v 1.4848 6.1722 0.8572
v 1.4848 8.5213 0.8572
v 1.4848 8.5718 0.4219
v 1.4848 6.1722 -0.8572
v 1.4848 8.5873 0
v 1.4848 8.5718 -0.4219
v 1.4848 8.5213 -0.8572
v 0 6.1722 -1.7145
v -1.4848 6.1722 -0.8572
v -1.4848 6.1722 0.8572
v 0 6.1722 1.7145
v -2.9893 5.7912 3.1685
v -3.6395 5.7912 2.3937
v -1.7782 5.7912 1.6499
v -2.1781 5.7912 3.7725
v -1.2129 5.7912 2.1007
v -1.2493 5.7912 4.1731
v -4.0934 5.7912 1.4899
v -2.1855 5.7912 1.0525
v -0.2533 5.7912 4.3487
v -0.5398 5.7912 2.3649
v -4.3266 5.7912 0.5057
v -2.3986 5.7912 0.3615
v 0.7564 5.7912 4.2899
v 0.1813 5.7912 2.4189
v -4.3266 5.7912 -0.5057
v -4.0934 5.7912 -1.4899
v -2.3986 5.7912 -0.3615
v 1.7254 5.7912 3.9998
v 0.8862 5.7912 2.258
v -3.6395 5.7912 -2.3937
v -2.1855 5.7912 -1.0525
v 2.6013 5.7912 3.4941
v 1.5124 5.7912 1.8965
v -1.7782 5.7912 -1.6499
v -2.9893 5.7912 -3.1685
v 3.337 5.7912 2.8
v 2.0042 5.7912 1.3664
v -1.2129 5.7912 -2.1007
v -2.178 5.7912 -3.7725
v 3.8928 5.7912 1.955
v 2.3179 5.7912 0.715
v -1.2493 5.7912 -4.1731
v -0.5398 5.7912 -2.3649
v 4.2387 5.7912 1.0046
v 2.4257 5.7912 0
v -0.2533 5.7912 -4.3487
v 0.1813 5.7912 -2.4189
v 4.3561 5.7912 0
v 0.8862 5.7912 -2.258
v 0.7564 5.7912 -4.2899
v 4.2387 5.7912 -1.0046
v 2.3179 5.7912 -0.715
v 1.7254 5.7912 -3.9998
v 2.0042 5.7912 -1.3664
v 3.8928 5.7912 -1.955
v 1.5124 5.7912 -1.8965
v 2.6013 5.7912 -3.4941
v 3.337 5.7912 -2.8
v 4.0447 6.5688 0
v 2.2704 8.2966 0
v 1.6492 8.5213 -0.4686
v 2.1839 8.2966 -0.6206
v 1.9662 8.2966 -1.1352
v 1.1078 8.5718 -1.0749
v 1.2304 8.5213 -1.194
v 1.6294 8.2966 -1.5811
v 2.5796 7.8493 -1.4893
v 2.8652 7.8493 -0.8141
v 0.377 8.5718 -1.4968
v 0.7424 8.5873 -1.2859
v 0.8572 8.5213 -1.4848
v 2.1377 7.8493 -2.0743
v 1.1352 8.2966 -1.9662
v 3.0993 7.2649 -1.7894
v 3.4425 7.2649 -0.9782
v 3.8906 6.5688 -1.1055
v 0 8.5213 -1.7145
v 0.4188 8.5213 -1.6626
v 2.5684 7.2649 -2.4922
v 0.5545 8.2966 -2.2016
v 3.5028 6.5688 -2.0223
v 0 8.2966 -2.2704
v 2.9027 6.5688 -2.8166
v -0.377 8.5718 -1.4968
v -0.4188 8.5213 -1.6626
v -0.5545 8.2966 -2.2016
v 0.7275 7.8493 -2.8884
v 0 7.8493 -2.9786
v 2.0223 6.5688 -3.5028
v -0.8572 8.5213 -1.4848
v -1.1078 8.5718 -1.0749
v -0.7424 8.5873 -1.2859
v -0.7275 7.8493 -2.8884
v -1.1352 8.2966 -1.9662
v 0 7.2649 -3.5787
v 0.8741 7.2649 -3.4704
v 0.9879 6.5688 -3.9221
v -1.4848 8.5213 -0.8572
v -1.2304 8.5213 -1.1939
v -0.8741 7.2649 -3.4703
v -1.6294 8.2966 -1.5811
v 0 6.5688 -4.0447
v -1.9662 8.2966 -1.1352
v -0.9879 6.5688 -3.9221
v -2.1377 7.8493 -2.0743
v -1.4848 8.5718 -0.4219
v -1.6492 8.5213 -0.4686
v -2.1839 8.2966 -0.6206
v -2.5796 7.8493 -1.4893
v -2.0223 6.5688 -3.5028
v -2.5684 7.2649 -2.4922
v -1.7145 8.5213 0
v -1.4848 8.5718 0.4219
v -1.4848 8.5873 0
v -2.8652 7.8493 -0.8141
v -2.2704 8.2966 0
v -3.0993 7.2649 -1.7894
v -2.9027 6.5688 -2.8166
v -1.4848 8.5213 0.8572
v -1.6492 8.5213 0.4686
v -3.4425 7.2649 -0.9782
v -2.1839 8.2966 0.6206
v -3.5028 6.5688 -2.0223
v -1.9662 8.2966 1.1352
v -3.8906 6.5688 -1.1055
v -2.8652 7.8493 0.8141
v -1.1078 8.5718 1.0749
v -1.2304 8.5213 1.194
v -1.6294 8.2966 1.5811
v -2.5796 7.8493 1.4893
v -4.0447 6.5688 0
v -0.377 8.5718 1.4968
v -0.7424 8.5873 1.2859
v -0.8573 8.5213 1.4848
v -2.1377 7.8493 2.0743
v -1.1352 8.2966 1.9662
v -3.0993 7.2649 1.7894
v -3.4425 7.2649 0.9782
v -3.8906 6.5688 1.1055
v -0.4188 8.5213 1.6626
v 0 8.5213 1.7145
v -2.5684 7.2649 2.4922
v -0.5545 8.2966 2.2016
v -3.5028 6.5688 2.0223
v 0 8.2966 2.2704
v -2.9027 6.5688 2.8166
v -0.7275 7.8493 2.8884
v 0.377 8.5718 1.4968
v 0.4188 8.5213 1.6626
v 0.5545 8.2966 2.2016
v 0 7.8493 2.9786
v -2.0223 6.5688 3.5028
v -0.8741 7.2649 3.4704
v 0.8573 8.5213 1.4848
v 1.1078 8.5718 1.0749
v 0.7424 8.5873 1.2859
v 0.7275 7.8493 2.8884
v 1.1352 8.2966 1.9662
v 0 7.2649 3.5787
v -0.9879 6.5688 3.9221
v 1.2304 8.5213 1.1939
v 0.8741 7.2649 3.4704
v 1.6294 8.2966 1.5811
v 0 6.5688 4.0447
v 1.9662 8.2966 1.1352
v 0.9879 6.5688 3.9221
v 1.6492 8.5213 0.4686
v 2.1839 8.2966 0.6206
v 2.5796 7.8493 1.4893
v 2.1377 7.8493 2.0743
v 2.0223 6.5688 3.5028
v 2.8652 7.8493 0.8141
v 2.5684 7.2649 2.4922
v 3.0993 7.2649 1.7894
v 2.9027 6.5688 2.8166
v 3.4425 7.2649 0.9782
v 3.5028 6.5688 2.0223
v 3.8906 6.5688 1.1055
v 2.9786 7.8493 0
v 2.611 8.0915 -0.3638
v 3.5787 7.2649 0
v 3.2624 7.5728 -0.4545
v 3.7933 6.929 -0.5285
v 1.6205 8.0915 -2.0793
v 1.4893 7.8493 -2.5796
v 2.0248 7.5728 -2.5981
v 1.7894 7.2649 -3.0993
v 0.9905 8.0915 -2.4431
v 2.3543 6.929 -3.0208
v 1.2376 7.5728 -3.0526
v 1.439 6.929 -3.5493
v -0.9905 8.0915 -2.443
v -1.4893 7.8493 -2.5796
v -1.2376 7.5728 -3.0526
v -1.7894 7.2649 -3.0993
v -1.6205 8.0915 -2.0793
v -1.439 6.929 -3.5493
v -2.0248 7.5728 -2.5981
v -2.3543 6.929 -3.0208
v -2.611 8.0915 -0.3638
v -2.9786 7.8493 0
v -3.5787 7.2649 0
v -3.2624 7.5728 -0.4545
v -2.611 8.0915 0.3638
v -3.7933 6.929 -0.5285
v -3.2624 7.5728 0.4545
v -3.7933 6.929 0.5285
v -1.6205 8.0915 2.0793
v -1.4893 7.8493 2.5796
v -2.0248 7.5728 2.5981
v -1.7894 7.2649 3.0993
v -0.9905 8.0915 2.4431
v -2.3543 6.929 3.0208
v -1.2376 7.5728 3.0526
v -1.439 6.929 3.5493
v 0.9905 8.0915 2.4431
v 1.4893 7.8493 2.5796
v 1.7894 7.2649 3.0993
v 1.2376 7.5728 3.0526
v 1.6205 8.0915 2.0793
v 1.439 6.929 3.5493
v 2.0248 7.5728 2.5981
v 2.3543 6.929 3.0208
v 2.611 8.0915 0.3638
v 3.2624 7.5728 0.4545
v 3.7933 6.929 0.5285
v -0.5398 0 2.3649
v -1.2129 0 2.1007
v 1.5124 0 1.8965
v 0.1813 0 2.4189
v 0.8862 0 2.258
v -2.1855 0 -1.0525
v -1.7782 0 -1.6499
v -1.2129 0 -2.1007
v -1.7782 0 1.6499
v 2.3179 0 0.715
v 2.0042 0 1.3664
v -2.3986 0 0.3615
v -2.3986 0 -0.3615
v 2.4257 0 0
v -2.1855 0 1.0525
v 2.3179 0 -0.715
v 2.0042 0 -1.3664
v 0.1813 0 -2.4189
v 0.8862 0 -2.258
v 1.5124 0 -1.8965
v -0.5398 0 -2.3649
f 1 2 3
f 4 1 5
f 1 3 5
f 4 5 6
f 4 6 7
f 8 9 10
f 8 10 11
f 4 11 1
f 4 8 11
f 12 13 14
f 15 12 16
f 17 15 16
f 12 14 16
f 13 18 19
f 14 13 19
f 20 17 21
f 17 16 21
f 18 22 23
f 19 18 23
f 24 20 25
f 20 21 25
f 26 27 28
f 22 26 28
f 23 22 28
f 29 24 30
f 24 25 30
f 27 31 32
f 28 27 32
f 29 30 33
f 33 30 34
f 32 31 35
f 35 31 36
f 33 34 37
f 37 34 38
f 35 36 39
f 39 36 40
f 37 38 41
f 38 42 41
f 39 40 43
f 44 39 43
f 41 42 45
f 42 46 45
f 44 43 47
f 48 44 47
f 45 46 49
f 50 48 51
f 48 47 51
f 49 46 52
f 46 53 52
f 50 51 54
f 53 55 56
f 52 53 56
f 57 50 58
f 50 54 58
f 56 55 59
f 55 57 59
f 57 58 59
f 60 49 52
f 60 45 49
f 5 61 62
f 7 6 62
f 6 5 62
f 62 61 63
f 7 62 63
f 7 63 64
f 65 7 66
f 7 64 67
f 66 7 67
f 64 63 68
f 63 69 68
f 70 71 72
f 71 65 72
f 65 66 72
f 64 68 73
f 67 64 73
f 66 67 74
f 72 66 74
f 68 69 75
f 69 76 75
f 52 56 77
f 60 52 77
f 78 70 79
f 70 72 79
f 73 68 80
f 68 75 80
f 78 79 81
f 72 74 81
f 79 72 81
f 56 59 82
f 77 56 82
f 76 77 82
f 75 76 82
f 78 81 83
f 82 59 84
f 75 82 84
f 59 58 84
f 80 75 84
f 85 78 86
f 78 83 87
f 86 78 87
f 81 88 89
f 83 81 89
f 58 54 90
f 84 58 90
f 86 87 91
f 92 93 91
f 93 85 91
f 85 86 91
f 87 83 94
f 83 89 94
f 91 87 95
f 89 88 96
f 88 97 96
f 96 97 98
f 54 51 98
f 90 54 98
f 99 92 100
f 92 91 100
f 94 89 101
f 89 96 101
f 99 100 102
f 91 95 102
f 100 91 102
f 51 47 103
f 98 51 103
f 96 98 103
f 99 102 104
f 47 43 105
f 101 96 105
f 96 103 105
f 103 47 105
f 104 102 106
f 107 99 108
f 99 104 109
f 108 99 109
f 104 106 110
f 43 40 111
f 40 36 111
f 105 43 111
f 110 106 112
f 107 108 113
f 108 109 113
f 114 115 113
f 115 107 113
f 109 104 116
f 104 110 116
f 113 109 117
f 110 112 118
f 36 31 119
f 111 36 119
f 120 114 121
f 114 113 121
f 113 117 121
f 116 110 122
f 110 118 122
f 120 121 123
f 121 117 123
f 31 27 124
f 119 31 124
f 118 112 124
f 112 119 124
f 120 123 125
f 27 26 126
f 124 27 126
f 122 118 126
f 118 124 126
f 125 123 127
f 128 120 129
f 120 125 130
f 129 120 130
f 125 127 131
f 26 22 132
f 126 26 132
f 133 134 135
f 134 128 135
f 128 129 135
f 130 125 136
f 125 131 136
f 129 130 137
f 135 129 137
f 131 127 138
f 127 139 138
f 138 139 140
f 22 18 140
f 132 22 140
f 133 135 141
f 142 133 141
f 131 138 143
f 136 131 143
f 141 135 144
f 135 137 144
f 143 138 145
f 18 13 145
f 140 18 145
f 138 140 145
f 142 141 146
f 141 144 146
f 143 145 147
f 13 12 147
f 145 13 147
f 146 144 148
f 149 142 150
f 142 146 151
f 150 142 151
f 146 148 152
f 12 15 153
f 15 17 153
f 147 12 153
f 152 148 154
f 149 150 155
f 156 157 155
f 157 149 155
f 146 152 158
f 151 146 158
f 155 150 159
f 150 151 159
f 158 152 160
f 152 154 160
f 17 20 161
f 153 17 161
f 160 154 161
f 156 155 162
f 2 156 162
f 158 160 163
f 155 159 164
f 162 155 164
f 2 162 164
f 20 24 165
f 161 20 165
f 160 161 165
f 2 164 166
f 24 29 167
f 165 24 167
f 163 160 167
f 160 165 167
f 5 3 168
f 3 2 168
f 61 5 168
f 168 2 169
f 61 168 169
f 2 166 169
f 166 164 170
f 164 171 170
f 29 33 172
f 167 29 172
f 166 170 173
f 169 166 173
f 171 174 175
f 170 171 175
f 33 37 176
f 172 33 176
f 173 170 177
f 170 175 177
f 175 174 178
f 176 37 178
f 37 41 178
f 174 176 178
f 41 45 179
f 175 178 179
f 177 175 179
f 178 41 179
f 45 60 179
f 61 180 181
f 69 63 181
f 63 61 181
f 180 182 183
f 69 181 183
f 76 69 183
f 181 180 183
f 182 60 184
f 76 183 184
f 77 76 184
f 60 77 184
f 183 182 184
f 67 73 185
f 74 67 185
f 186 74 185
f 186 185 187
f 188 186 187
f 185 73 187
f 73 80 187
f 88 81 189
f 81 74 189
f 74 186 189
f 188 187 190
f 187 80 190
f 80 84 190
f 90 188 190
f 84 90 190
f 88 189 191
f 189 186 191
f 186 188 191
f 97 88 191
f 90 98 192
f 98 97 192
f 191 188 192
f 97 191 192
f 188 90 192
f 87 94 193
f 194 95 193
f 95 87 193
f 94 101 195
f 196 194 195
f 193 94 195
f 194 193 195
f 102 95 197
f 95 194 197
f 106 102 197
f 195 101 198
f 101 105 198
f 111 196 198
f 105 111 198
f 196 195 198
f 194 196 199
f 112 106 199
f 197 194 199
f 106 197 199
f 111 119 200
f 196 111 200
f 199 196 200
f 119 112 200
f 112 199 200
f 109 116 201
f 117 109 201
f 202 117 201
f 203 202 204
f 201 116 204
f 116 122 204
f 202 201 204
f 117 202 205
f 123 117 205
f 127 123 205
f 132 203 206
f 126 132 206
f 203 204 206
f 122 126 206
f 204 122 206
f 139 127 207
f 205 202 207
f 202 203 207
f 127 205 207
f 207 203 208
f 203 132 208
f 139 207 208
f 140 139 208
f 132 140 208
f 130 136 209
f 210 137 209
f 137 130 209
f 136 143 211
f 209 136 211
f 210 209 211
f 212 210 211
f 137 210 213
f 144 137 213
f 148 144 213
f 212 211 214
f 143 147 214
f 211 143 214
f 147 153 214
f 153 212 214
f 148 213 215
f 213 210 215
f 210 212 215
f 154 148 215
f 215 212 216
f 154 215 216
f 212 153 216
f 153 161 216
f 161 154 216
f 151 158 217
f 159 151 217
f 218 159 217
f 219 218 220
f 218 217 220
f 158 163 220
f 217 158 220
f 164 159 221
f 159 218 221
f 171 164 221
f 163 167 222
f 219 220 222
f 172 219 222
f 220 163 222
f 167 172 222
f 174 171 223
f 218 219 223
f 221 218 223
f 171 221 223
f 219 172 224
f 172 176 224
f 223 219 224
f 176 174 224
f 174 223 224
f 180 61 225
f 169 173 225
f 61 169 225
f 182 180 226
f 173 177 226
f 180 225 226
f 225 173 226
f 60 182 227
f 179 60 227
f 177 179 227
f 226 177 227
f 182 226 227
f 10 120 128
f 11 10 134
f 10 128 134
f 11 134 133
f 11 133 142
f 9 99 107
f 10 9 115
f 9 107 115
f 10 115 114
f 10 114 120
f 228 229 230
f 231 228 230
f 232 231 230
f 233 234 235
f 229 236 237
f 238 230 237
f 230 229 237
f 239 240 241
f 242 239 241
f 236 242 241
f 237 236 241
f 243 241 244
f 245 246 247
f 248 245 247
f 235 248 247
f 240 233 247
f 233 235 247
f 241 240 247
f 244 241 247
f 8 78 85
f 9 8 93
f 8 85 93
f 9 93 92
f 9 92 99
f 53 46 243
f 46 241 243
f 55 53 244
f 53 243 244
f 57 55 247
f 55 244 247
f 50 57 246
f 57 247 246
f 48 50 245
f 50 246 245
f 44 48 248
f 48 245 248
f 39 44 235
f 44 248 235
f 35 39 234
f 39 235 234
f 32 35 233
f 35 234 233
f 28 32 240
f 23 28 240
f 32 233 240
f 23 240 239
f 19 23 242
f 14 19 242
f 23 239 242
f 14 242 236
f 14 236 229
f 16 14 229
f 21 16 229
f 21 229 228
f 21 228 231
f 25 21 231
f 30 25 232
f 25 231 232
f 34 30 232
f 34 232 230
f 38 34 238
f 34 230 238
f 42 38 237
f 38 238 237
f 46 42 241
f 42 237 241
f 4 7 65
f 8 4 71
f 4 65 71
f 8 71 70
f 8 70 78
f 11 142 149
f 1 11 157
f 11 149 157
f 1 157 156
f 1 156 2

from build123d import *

# Parameters (mm, degrees)
CUT_EXTRUDE1_DEPTH = 2.54


with BuildPart() as part:
    # Sketch1 → Revolve1 (revolve)
    with BuildSketch(Plane.XY):
        with BuildLine():
            Line((0, 0), (0, 8.7122))
            Line((0, 8.7122), (0.490735938, 8.7122))
            ThreePointArc((0.490735938, 8.7122), (2.913197513, 7.899826069), (4.3561, 5.7912))
            Line((4.3561, 5.7912), (2.4257, 5.7912))
            Line((2.4257, 5.7912), (2.4257, 0))
            Line((2.4257, 0), (0, 0))
        make_face()
    revolve(axis=Axis((0, 0, 0), (0, 1, 0)))

    # Sketch2 → Cut-Extrude1 (cut)
    with BuildSketch(Plane(origin=(0, 8.7122, 0), x_dir=(1, 0, 0), z_dir=(0, 1, 0))):
        Polygon((0, -1.7145), (1.484800555, -0.85725), (1.484800555, 0.85725), (0, 1.7145), (-1.484800555, 0.85725), (-1.484800555, -0.85725), align=None)
    extrude(amount=-CUT_EXTRUDE1_DEPTH, mode=Mode.SUBTRACT)


solid = part.part
